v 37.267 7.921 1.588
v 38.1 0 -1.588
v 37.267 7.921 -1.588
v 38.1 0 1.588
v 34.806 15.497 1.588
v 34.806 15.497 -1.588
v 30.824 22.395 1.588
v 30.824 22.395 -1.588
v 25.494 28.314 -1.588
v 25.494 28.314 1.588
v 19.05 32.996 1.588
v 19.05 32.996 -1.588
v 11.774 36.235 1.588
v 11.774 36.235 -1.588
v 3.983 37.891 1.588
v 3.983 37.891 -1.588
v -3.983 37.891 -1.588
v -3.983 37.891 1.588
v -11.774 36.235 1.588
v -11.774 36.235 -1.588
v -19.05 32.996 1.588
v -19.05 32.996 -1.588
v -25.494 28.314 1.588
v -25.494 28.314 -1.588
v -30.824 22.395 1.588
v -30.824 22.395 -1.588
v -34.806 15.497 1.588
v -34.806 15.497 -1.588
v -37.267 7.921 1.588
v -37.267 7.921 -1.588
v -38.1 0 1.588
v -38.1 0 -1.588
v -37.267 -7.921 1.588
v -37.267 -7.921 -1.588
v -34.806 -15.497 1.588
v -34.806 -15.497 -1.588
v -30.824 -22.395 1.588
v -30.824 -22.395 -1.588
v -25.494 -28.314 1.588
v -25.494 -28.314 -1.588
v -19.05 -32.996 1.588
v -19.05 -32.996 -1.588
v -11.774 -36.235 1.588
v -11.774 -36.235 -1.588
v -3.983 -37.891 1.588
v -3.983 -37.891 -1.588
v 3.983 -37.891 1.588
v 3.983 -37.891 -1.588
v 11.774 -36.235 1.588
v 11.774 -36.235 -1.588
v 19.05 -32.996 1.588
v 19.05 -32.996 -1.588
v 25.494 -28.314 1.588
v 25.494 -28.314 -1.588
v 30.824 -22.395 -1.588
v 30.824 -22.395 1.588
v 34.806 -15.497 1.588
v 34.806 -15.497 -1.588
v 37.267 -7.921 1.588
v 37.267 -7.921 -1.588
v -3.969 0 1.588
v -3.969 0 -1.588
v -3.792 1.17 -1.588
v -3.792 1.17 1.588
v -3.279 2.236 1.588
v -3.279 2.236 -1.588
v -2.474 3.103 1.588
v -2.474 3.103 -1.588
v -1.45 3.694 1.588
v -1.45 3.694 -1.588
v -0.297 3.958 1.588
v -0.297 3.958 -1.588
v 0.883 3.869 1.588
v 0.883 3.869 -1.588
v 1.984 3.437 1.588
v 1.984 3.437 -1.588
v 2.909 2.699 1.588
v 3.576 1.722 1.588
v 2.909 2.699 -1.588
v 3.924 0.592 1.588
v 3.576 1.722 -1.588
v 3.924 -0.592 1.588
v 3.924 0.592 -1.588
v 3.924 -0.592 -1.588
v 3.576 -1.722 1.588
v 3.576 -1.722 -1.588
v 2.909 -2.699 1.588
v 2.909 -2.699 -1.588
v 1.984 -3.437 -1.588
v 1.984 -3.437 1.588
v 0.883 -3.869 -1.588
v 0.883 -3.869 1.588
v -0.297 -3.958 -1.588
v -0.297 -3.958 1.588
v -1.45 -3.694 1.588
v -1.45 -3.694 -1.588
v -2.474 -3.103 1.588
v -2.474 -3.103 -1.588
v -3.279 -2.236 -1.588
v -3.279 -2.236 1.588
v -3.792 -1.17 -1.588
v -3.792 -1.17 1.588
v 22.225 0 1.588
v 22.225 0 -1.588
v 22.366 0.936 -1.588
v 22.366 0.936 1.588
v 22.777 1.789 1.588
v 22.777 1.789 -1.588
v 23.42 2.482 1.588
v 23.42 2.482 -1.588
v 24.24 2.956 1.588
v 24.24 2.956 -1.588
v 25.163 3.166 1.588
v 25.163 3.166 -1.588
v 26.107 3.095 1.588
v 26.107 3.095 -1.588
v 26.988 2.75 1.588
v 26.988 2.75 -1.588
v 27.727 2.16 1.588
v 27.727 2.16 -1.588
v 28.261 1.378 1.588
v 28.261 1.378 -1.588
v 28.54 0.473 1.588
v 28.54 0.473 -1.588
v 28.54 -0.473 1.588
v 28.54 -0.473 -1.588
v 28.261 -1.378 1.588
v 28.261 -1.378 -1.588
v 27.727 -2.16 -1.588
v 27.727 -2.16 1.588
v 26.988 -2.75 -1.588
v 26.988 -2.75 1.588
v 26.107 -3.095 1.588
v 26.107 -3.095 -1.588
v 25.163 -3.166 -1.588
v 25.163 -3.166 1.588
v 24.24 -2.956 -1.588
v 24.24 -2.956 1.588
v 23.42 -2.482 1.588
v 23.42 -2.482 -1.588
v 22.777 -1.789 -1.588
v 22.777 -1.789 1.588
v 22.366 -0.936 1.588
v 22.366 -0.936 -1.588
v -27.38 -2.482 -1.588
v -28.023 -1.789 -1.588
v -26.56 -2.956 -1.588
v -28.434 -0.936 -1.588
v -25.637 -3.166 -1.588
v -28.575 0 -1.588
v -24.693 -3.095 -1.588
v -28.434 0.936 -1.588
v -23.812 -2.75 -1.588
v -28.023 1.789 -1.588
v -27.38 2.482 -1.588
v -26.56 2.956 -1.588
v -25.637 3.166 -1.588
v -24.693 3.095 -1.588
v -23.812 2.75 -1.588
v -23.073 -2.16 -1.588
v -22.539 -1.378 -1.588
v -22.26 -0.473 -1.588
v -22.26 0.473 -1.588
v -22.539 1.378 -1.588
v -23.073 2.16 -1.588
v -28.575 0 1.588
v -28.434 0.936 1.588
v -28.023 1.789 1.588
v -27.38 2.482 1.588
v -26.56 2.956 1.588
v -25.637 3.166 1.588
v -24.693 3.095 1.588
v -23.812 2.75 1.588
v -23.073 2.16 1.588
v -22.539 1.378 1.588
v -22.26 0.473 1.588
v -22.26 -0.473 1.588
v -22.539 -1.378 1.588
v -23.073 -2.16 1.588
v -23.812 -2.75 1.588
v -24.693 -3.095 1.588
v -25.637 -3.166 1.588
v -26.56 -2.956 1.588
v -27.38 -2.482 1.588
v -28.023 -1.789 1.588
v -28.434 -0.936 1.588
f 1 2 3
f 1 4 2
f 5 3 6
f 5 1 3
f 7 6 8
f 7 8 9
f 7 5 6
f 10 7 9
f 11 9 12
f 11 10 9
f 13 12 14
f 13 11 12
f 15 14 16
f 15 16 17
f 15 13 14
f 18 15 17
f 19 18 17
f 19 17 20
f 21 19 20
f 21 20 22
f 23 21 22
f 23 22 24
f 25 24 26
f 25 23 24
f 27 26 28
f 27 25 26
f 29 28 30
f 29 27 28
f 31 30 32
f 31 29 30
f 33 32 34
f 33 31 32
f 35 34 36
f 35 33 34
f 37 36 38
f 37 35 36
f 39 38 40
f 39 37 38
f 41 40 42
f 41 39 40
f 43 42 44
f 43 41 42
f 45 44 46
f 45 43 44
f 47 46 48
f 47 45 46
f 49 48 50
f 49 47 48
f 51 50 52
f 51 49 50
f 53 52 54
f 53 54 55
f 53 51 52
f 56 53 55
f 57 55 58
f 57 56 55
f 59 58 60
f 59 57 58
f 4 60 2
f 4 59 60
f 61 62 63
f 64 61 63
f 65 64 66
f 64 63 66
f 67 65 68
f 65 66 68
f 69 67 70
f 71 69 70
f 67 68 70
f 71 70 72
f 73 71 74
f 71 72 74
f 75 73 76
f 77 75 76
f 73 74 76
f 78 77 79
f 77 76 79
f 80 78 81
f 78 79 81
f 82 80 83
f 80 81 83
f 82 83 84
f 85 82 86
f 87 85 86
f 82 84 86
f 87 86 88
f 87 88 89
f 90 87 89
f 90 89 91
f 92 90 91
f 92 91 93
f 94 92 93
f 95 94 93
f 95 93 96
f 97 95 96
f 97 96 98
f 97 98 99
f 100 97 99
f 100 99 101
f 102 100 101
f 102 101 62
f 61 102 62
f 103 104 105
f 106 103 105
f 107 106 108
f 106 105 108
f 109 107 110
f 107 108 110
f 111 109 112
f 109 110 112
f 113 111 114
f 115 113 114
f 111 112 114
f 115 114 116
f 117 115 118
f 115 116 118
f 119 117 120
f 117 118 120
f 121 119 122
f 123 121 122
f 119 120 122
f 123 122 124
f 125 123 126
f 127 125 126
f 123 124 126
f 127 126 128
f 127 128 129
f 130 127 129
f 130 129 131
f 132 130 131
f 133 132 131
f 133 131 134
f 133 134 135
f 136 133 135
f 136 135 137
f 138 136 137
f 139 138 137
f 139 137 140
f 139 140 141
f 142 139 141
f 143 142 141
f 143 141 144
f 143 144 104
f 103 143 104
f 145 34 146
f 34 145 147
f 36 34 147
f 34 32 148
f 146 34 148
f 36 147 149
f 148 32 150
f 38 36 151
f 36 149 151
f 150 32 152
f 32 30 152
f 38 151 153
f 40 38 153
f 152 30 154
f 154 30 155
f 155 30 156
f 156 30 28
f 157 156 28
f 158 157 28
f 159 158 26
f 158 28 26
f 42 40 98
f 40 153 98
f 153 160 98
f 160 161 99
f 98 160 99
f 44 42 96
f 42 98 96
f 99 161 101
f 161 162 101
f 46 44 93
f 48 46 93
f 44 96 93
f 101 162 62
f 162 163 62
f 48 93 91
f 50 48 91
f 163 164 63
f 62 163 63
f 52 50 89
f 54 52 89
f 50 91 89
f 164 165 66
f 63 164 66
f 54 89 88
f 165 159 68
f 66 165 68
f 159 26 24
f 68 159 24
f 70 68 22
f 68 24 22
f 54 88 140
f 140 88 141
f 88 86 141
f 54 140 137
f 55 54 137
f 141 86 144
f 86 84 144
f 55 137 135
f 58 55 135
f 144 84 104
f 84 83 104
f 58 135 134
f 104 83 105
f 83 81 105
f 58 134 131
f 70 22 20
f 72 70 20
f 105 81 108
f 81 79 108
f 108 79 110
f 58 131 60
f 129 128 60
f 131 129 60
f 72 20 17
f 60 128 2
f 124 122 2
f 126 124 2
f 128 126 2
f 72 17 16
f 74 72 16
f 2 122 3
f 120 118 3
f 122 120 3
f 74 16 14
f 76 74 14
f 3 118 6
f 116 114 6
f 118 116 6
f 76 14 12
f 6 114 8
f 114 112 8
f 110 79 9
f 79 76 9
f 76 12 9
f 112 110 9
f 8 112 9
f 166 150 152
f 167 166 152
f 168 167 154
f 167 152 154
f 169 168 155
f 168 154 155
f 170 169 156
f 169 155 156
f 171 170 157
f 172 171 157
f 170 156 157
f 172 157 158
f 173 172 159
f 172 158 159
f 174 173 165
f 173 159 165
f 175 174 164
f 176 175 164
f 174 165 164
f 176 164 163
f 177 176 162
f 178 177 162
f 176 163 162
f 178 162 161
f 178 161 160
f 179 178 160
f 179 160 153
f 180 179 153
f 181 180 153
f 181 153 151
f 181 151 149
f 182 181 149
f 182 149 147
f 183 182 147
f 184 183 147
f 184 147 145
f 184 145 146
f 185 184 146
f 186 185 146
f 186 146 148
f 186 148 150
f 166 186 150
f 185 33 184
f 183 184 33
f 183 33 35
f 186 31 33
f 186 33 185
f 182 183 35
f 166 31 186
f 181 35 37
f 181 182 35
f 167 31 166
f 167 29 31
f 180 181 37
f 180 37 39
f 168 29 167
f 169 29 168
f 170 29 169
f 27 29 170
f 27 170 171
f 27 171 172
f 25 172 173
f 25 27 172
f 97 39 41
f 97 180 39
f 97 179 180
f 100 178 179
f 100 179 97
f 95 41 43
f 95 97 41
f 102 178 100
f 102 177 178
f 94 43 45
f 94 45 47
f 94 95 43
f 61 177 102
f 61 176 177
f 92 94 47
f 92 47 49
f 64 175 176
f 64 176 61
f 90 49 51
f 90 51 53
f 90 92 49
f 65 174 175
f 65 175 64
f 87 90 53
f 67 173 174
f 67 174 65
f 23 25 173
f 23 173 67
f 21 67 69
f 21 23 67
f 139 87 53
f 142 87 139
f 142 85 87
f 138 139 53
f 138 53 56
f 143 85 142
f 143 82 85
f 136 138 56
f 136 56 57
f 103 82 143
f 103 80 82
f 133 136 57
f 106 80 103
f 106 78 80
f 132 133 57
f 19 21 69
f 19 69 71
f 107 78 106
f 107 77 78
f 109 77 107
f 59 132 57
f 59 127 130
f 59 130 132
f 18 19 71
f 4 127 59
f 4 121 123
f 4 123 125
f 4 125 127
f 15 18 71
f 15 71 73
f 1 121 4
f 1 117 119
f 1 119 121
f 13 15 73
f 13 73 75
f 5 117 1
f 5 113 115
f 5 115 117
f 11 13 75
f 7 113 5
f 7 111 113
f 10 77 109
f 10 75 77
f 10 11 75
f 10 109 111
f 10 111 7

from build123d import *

# Parameters (mm, degrees)
SKETCH1_R                          = 38.1
BOSS_EXTRUDE1_DEPTH                = 1.5875
F_1_4_0_25_DIAMETER_HOLE1_D        = 6.35
F_5_16_0_3125_DIAMETER_HOLE1_D     = 7.9375
F_5_16_0_3125_DIAMETER_HOLE1_DEPTH = 3.302


with BuildPart() as part:
    # Sketch1 → Boss-Extrude1 (new body, symmetric)
    with BuildSketch(Plane.XY):
        Circle(SKETCH1_R)
    extrude(amount=BOSS_EXTRUDE1_DEPTH, both=True)

    # 1/4 (0.25) Diameter Hole1 (through all)
    with Locations(Plane.XY.offset(1.5875)):
        with Locations((-25.4, 0), (25.4, 0)):
            Hole(F_1_4_0_25_DIAMETER_HOLE1_D / 2)

    # 5/16 (0.3125) Diameter Hole1
    with Locations(Plane.XY.offset(1.5875)):
        with Locations((0, 0)):
            Hole(F_5_16_0_3125_DIAMETER_HOLE1_D / 2, depth=F_5_16_0_3125_DIAMETER_HOLE1_DEPTH)


solid = part.part
